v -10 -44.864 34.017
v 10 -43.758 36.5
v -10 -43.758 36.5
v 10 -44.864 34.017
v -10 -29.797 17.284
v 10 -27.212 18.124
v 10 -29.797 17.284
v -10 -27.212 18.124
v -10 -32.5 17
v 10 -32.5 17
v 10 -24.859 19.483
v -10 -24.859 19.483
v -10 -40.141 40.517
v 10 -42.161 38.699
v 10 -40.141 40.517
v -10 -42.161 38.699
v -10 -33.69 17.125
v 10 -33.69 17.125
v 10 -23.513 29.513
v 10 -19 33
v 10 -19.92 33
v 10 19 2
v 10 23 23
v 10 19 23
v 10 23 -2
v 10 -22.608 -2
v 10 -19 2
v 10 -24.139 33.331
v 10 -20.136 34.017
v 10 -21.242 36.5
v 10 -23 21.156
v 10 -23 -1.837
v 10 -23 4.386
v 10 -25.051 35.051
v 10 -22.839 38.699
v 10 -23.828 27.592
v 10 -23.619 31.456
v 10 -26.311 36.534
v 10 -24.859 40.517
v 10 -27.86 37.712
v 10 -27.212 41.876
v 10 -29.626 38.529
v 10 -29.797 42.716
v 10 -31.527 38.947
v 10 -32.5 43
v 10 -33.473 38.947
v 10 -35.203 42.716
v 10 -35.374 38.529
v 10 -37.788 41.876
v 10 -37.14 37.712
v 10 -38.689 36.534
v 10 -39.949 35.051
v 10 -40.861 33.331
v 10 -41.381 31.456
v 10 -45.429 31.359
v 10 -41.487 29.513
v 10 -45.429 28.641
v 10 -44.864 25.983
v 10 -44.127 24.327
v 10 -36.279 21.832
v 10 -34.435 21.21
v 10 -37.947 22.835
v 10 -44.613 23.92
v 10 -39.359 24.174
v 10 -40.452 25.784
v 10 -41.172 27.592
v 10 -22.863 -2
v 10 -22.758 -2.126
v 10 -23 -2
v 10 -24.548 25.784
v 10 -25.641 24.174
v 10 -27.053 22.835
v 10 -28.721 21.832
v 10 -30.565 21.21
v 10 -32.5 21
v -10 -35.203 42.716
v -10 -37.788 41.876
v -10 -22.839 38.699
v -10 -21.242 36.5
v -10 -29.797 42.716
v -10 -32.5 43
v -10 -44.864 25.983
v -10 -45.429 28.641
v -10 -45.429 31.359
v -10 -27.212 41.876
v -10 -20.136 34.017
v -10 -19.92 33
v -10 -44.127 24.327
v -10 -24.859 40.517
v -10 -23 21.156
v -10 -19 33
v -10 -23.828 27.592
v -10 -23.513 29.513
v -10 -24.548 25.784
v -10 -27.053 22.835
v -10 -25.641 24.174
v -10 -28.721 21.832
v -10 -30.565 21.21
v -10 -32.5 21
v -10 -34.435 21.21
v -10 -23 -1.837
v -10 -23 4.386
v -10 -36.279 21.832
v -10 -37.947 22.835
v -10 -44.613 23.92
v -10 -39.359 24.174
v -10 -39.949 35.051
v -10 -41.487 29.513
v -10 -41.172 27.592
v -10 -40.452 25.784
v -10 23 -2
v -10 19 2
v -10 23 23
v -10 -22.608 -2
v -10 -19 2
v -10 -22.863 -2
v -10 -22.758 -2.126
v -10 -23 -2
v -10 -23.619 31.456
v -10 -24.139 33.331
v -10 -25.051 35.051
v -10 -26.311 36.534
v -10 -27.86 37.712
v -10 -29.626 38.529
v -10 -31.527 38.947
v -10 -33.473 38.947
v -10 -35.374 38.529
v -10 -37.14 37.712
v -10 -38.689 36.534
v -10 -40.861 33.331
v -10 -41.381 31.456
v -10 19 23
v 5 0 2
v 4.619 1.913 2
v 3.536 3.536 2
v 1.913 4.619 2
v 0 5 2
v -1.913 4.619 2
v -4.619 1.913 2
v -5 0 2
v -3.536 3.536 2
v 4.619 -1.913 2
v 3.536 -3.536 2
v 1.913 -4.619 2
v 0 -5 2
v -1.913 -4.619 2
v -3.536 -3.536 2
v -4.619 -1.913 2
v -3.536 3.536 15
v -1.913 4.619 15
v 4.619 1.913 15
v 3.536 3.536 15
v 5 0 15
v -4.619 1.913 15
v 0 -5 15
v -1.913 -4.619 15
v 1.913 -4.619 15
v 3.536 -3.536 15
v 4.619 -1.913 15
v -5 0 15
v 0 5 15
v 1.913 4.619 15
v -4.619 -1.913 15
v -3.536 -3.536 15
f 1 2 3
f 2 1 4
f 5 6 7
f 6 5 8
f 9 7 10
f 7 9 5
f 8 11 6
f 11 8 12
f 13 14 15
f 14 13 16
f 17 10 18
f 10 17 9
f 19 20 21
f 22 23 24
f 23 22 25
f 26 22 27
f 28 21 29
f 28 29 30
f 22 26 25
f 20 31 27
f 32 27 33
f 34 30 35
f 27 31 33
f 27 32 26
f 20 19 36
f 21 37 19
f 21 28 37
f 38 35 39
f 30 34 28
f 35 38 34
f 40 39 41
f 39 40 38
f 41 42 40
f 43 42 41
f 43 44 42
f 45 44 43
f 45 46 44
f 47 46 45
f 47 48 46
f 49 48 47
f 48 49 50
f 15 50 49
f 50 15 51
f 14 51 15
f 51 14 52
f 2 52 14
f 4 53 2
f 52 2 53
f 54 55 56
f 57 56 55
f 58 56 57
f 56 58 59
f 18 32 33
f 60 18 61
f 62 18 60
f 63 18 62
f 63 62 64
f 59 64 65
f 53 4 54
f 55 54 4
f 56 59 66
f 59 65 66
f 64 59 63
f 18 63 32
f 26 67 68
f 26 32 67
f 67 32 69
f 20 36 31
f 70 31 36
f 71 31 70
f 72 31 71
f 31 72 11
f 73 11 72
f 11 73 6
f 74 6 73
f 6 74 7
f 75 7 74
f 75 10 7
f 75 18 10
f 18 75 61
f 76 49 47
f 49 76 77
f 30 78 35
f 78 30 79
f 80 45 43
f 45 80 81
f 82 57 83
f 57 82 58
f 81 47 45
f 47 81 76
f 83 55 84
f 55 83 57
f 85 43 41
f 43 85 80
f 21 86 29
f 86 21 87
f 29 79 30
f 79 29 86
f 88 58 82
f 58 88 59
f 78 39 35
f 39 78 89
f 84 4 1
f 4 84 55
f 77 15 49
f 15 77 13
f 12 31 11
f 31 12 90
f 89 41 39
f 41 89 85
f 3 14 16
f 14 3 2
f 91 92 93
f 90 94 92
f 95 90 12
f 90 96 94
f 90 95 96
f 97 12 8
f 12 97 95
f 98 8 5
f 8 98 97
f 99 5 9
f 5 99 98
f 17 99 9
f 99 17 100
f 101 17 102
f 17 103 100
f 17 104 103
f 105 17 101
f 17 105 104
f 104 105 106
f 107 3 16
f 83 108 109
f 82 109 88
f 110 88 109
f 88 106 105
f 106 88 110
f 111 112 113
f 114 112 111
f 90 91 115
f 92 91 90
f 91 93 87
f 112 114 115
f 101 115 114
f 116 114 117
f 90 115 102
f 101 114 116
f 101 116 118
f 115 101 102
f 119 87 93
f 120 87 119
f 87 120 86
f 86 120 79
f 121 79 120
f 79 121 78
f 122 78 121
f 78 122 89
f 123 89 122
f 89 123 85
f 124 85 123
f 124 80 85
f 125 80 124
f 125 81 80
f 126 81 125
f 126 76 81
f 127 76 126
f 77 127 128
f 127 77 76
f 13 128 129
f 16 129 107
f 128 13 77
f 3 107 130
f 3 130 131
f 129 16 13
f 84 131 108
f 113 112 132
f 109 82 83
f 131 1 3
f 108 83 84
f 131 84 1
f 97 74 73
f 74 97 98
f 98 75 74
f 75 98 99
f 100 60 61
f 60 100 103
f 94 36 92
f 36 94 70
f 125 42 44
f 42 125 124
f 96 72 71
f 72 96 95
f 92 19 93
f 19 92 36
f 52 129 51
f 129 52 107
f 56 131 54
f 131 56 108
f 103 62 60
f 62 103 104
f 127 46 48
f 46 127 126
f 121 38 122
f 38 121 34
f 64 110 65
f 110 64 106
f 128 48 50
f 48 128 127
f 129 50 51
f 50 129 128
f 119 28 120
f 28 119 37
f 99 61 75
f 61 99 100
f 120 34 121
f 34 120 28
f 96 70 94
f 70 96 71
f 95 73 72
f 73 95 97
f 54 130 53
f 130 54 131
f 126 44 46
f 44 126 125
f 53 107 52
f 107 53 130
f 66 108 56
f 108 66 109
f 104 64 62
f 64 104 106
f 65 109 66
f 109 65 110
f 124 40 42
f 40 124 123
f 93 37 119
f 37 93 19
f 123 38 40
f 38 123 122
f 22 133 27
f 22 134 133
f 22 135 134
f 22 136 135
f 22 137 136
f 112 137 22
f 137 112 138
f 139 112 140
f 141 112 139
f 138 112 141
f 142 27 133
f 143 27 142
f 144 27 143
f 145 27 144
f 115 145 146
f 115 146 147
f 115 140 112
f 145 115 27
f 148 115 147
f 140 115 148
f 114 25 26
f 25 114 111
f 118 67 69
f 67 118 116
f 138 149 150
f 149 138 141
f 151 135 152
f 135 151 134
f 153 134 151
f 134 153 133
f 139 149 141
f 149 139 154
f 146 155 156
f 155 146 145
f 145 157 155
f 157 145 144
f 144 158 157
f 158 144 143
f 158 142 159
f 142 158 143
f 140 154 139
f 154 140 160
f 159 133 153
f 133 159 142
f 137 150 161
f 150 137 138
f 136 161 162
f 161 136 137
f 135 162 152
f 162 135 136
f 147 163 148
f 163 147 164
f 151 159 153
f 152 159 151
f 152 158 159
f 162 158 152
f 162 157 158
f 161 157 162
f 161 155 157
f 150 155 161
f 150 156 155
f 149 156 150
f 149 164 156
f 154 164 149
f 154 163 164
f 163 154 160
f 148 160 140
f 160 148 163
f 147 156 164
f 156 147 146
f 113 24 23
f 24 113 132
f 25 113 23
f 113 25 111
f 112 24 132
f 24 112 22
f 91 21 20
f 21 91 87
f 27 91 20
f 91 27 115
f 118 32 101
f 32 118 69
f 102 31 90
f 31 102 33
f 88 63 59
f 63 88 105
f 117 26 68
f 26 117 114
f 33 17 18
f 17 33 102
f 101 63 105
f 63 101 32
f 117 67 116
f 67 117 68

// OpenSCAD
cube([20,45,4], true);
cylinder(15,5,5);
translate([0,21,10.5]) cube([20,4,25], true);
translate([0,-21,15.5]) cube([20,4,35], true);
rotate([40,0,0])  translate([0,-16.8,30]) cube([20,4,34], true);

translate([0,-32.5,30])  rotate([0,90,0]) 
difference(){
cylinder(20,13,13, true);
cylinder(21,9,9, true);
}
